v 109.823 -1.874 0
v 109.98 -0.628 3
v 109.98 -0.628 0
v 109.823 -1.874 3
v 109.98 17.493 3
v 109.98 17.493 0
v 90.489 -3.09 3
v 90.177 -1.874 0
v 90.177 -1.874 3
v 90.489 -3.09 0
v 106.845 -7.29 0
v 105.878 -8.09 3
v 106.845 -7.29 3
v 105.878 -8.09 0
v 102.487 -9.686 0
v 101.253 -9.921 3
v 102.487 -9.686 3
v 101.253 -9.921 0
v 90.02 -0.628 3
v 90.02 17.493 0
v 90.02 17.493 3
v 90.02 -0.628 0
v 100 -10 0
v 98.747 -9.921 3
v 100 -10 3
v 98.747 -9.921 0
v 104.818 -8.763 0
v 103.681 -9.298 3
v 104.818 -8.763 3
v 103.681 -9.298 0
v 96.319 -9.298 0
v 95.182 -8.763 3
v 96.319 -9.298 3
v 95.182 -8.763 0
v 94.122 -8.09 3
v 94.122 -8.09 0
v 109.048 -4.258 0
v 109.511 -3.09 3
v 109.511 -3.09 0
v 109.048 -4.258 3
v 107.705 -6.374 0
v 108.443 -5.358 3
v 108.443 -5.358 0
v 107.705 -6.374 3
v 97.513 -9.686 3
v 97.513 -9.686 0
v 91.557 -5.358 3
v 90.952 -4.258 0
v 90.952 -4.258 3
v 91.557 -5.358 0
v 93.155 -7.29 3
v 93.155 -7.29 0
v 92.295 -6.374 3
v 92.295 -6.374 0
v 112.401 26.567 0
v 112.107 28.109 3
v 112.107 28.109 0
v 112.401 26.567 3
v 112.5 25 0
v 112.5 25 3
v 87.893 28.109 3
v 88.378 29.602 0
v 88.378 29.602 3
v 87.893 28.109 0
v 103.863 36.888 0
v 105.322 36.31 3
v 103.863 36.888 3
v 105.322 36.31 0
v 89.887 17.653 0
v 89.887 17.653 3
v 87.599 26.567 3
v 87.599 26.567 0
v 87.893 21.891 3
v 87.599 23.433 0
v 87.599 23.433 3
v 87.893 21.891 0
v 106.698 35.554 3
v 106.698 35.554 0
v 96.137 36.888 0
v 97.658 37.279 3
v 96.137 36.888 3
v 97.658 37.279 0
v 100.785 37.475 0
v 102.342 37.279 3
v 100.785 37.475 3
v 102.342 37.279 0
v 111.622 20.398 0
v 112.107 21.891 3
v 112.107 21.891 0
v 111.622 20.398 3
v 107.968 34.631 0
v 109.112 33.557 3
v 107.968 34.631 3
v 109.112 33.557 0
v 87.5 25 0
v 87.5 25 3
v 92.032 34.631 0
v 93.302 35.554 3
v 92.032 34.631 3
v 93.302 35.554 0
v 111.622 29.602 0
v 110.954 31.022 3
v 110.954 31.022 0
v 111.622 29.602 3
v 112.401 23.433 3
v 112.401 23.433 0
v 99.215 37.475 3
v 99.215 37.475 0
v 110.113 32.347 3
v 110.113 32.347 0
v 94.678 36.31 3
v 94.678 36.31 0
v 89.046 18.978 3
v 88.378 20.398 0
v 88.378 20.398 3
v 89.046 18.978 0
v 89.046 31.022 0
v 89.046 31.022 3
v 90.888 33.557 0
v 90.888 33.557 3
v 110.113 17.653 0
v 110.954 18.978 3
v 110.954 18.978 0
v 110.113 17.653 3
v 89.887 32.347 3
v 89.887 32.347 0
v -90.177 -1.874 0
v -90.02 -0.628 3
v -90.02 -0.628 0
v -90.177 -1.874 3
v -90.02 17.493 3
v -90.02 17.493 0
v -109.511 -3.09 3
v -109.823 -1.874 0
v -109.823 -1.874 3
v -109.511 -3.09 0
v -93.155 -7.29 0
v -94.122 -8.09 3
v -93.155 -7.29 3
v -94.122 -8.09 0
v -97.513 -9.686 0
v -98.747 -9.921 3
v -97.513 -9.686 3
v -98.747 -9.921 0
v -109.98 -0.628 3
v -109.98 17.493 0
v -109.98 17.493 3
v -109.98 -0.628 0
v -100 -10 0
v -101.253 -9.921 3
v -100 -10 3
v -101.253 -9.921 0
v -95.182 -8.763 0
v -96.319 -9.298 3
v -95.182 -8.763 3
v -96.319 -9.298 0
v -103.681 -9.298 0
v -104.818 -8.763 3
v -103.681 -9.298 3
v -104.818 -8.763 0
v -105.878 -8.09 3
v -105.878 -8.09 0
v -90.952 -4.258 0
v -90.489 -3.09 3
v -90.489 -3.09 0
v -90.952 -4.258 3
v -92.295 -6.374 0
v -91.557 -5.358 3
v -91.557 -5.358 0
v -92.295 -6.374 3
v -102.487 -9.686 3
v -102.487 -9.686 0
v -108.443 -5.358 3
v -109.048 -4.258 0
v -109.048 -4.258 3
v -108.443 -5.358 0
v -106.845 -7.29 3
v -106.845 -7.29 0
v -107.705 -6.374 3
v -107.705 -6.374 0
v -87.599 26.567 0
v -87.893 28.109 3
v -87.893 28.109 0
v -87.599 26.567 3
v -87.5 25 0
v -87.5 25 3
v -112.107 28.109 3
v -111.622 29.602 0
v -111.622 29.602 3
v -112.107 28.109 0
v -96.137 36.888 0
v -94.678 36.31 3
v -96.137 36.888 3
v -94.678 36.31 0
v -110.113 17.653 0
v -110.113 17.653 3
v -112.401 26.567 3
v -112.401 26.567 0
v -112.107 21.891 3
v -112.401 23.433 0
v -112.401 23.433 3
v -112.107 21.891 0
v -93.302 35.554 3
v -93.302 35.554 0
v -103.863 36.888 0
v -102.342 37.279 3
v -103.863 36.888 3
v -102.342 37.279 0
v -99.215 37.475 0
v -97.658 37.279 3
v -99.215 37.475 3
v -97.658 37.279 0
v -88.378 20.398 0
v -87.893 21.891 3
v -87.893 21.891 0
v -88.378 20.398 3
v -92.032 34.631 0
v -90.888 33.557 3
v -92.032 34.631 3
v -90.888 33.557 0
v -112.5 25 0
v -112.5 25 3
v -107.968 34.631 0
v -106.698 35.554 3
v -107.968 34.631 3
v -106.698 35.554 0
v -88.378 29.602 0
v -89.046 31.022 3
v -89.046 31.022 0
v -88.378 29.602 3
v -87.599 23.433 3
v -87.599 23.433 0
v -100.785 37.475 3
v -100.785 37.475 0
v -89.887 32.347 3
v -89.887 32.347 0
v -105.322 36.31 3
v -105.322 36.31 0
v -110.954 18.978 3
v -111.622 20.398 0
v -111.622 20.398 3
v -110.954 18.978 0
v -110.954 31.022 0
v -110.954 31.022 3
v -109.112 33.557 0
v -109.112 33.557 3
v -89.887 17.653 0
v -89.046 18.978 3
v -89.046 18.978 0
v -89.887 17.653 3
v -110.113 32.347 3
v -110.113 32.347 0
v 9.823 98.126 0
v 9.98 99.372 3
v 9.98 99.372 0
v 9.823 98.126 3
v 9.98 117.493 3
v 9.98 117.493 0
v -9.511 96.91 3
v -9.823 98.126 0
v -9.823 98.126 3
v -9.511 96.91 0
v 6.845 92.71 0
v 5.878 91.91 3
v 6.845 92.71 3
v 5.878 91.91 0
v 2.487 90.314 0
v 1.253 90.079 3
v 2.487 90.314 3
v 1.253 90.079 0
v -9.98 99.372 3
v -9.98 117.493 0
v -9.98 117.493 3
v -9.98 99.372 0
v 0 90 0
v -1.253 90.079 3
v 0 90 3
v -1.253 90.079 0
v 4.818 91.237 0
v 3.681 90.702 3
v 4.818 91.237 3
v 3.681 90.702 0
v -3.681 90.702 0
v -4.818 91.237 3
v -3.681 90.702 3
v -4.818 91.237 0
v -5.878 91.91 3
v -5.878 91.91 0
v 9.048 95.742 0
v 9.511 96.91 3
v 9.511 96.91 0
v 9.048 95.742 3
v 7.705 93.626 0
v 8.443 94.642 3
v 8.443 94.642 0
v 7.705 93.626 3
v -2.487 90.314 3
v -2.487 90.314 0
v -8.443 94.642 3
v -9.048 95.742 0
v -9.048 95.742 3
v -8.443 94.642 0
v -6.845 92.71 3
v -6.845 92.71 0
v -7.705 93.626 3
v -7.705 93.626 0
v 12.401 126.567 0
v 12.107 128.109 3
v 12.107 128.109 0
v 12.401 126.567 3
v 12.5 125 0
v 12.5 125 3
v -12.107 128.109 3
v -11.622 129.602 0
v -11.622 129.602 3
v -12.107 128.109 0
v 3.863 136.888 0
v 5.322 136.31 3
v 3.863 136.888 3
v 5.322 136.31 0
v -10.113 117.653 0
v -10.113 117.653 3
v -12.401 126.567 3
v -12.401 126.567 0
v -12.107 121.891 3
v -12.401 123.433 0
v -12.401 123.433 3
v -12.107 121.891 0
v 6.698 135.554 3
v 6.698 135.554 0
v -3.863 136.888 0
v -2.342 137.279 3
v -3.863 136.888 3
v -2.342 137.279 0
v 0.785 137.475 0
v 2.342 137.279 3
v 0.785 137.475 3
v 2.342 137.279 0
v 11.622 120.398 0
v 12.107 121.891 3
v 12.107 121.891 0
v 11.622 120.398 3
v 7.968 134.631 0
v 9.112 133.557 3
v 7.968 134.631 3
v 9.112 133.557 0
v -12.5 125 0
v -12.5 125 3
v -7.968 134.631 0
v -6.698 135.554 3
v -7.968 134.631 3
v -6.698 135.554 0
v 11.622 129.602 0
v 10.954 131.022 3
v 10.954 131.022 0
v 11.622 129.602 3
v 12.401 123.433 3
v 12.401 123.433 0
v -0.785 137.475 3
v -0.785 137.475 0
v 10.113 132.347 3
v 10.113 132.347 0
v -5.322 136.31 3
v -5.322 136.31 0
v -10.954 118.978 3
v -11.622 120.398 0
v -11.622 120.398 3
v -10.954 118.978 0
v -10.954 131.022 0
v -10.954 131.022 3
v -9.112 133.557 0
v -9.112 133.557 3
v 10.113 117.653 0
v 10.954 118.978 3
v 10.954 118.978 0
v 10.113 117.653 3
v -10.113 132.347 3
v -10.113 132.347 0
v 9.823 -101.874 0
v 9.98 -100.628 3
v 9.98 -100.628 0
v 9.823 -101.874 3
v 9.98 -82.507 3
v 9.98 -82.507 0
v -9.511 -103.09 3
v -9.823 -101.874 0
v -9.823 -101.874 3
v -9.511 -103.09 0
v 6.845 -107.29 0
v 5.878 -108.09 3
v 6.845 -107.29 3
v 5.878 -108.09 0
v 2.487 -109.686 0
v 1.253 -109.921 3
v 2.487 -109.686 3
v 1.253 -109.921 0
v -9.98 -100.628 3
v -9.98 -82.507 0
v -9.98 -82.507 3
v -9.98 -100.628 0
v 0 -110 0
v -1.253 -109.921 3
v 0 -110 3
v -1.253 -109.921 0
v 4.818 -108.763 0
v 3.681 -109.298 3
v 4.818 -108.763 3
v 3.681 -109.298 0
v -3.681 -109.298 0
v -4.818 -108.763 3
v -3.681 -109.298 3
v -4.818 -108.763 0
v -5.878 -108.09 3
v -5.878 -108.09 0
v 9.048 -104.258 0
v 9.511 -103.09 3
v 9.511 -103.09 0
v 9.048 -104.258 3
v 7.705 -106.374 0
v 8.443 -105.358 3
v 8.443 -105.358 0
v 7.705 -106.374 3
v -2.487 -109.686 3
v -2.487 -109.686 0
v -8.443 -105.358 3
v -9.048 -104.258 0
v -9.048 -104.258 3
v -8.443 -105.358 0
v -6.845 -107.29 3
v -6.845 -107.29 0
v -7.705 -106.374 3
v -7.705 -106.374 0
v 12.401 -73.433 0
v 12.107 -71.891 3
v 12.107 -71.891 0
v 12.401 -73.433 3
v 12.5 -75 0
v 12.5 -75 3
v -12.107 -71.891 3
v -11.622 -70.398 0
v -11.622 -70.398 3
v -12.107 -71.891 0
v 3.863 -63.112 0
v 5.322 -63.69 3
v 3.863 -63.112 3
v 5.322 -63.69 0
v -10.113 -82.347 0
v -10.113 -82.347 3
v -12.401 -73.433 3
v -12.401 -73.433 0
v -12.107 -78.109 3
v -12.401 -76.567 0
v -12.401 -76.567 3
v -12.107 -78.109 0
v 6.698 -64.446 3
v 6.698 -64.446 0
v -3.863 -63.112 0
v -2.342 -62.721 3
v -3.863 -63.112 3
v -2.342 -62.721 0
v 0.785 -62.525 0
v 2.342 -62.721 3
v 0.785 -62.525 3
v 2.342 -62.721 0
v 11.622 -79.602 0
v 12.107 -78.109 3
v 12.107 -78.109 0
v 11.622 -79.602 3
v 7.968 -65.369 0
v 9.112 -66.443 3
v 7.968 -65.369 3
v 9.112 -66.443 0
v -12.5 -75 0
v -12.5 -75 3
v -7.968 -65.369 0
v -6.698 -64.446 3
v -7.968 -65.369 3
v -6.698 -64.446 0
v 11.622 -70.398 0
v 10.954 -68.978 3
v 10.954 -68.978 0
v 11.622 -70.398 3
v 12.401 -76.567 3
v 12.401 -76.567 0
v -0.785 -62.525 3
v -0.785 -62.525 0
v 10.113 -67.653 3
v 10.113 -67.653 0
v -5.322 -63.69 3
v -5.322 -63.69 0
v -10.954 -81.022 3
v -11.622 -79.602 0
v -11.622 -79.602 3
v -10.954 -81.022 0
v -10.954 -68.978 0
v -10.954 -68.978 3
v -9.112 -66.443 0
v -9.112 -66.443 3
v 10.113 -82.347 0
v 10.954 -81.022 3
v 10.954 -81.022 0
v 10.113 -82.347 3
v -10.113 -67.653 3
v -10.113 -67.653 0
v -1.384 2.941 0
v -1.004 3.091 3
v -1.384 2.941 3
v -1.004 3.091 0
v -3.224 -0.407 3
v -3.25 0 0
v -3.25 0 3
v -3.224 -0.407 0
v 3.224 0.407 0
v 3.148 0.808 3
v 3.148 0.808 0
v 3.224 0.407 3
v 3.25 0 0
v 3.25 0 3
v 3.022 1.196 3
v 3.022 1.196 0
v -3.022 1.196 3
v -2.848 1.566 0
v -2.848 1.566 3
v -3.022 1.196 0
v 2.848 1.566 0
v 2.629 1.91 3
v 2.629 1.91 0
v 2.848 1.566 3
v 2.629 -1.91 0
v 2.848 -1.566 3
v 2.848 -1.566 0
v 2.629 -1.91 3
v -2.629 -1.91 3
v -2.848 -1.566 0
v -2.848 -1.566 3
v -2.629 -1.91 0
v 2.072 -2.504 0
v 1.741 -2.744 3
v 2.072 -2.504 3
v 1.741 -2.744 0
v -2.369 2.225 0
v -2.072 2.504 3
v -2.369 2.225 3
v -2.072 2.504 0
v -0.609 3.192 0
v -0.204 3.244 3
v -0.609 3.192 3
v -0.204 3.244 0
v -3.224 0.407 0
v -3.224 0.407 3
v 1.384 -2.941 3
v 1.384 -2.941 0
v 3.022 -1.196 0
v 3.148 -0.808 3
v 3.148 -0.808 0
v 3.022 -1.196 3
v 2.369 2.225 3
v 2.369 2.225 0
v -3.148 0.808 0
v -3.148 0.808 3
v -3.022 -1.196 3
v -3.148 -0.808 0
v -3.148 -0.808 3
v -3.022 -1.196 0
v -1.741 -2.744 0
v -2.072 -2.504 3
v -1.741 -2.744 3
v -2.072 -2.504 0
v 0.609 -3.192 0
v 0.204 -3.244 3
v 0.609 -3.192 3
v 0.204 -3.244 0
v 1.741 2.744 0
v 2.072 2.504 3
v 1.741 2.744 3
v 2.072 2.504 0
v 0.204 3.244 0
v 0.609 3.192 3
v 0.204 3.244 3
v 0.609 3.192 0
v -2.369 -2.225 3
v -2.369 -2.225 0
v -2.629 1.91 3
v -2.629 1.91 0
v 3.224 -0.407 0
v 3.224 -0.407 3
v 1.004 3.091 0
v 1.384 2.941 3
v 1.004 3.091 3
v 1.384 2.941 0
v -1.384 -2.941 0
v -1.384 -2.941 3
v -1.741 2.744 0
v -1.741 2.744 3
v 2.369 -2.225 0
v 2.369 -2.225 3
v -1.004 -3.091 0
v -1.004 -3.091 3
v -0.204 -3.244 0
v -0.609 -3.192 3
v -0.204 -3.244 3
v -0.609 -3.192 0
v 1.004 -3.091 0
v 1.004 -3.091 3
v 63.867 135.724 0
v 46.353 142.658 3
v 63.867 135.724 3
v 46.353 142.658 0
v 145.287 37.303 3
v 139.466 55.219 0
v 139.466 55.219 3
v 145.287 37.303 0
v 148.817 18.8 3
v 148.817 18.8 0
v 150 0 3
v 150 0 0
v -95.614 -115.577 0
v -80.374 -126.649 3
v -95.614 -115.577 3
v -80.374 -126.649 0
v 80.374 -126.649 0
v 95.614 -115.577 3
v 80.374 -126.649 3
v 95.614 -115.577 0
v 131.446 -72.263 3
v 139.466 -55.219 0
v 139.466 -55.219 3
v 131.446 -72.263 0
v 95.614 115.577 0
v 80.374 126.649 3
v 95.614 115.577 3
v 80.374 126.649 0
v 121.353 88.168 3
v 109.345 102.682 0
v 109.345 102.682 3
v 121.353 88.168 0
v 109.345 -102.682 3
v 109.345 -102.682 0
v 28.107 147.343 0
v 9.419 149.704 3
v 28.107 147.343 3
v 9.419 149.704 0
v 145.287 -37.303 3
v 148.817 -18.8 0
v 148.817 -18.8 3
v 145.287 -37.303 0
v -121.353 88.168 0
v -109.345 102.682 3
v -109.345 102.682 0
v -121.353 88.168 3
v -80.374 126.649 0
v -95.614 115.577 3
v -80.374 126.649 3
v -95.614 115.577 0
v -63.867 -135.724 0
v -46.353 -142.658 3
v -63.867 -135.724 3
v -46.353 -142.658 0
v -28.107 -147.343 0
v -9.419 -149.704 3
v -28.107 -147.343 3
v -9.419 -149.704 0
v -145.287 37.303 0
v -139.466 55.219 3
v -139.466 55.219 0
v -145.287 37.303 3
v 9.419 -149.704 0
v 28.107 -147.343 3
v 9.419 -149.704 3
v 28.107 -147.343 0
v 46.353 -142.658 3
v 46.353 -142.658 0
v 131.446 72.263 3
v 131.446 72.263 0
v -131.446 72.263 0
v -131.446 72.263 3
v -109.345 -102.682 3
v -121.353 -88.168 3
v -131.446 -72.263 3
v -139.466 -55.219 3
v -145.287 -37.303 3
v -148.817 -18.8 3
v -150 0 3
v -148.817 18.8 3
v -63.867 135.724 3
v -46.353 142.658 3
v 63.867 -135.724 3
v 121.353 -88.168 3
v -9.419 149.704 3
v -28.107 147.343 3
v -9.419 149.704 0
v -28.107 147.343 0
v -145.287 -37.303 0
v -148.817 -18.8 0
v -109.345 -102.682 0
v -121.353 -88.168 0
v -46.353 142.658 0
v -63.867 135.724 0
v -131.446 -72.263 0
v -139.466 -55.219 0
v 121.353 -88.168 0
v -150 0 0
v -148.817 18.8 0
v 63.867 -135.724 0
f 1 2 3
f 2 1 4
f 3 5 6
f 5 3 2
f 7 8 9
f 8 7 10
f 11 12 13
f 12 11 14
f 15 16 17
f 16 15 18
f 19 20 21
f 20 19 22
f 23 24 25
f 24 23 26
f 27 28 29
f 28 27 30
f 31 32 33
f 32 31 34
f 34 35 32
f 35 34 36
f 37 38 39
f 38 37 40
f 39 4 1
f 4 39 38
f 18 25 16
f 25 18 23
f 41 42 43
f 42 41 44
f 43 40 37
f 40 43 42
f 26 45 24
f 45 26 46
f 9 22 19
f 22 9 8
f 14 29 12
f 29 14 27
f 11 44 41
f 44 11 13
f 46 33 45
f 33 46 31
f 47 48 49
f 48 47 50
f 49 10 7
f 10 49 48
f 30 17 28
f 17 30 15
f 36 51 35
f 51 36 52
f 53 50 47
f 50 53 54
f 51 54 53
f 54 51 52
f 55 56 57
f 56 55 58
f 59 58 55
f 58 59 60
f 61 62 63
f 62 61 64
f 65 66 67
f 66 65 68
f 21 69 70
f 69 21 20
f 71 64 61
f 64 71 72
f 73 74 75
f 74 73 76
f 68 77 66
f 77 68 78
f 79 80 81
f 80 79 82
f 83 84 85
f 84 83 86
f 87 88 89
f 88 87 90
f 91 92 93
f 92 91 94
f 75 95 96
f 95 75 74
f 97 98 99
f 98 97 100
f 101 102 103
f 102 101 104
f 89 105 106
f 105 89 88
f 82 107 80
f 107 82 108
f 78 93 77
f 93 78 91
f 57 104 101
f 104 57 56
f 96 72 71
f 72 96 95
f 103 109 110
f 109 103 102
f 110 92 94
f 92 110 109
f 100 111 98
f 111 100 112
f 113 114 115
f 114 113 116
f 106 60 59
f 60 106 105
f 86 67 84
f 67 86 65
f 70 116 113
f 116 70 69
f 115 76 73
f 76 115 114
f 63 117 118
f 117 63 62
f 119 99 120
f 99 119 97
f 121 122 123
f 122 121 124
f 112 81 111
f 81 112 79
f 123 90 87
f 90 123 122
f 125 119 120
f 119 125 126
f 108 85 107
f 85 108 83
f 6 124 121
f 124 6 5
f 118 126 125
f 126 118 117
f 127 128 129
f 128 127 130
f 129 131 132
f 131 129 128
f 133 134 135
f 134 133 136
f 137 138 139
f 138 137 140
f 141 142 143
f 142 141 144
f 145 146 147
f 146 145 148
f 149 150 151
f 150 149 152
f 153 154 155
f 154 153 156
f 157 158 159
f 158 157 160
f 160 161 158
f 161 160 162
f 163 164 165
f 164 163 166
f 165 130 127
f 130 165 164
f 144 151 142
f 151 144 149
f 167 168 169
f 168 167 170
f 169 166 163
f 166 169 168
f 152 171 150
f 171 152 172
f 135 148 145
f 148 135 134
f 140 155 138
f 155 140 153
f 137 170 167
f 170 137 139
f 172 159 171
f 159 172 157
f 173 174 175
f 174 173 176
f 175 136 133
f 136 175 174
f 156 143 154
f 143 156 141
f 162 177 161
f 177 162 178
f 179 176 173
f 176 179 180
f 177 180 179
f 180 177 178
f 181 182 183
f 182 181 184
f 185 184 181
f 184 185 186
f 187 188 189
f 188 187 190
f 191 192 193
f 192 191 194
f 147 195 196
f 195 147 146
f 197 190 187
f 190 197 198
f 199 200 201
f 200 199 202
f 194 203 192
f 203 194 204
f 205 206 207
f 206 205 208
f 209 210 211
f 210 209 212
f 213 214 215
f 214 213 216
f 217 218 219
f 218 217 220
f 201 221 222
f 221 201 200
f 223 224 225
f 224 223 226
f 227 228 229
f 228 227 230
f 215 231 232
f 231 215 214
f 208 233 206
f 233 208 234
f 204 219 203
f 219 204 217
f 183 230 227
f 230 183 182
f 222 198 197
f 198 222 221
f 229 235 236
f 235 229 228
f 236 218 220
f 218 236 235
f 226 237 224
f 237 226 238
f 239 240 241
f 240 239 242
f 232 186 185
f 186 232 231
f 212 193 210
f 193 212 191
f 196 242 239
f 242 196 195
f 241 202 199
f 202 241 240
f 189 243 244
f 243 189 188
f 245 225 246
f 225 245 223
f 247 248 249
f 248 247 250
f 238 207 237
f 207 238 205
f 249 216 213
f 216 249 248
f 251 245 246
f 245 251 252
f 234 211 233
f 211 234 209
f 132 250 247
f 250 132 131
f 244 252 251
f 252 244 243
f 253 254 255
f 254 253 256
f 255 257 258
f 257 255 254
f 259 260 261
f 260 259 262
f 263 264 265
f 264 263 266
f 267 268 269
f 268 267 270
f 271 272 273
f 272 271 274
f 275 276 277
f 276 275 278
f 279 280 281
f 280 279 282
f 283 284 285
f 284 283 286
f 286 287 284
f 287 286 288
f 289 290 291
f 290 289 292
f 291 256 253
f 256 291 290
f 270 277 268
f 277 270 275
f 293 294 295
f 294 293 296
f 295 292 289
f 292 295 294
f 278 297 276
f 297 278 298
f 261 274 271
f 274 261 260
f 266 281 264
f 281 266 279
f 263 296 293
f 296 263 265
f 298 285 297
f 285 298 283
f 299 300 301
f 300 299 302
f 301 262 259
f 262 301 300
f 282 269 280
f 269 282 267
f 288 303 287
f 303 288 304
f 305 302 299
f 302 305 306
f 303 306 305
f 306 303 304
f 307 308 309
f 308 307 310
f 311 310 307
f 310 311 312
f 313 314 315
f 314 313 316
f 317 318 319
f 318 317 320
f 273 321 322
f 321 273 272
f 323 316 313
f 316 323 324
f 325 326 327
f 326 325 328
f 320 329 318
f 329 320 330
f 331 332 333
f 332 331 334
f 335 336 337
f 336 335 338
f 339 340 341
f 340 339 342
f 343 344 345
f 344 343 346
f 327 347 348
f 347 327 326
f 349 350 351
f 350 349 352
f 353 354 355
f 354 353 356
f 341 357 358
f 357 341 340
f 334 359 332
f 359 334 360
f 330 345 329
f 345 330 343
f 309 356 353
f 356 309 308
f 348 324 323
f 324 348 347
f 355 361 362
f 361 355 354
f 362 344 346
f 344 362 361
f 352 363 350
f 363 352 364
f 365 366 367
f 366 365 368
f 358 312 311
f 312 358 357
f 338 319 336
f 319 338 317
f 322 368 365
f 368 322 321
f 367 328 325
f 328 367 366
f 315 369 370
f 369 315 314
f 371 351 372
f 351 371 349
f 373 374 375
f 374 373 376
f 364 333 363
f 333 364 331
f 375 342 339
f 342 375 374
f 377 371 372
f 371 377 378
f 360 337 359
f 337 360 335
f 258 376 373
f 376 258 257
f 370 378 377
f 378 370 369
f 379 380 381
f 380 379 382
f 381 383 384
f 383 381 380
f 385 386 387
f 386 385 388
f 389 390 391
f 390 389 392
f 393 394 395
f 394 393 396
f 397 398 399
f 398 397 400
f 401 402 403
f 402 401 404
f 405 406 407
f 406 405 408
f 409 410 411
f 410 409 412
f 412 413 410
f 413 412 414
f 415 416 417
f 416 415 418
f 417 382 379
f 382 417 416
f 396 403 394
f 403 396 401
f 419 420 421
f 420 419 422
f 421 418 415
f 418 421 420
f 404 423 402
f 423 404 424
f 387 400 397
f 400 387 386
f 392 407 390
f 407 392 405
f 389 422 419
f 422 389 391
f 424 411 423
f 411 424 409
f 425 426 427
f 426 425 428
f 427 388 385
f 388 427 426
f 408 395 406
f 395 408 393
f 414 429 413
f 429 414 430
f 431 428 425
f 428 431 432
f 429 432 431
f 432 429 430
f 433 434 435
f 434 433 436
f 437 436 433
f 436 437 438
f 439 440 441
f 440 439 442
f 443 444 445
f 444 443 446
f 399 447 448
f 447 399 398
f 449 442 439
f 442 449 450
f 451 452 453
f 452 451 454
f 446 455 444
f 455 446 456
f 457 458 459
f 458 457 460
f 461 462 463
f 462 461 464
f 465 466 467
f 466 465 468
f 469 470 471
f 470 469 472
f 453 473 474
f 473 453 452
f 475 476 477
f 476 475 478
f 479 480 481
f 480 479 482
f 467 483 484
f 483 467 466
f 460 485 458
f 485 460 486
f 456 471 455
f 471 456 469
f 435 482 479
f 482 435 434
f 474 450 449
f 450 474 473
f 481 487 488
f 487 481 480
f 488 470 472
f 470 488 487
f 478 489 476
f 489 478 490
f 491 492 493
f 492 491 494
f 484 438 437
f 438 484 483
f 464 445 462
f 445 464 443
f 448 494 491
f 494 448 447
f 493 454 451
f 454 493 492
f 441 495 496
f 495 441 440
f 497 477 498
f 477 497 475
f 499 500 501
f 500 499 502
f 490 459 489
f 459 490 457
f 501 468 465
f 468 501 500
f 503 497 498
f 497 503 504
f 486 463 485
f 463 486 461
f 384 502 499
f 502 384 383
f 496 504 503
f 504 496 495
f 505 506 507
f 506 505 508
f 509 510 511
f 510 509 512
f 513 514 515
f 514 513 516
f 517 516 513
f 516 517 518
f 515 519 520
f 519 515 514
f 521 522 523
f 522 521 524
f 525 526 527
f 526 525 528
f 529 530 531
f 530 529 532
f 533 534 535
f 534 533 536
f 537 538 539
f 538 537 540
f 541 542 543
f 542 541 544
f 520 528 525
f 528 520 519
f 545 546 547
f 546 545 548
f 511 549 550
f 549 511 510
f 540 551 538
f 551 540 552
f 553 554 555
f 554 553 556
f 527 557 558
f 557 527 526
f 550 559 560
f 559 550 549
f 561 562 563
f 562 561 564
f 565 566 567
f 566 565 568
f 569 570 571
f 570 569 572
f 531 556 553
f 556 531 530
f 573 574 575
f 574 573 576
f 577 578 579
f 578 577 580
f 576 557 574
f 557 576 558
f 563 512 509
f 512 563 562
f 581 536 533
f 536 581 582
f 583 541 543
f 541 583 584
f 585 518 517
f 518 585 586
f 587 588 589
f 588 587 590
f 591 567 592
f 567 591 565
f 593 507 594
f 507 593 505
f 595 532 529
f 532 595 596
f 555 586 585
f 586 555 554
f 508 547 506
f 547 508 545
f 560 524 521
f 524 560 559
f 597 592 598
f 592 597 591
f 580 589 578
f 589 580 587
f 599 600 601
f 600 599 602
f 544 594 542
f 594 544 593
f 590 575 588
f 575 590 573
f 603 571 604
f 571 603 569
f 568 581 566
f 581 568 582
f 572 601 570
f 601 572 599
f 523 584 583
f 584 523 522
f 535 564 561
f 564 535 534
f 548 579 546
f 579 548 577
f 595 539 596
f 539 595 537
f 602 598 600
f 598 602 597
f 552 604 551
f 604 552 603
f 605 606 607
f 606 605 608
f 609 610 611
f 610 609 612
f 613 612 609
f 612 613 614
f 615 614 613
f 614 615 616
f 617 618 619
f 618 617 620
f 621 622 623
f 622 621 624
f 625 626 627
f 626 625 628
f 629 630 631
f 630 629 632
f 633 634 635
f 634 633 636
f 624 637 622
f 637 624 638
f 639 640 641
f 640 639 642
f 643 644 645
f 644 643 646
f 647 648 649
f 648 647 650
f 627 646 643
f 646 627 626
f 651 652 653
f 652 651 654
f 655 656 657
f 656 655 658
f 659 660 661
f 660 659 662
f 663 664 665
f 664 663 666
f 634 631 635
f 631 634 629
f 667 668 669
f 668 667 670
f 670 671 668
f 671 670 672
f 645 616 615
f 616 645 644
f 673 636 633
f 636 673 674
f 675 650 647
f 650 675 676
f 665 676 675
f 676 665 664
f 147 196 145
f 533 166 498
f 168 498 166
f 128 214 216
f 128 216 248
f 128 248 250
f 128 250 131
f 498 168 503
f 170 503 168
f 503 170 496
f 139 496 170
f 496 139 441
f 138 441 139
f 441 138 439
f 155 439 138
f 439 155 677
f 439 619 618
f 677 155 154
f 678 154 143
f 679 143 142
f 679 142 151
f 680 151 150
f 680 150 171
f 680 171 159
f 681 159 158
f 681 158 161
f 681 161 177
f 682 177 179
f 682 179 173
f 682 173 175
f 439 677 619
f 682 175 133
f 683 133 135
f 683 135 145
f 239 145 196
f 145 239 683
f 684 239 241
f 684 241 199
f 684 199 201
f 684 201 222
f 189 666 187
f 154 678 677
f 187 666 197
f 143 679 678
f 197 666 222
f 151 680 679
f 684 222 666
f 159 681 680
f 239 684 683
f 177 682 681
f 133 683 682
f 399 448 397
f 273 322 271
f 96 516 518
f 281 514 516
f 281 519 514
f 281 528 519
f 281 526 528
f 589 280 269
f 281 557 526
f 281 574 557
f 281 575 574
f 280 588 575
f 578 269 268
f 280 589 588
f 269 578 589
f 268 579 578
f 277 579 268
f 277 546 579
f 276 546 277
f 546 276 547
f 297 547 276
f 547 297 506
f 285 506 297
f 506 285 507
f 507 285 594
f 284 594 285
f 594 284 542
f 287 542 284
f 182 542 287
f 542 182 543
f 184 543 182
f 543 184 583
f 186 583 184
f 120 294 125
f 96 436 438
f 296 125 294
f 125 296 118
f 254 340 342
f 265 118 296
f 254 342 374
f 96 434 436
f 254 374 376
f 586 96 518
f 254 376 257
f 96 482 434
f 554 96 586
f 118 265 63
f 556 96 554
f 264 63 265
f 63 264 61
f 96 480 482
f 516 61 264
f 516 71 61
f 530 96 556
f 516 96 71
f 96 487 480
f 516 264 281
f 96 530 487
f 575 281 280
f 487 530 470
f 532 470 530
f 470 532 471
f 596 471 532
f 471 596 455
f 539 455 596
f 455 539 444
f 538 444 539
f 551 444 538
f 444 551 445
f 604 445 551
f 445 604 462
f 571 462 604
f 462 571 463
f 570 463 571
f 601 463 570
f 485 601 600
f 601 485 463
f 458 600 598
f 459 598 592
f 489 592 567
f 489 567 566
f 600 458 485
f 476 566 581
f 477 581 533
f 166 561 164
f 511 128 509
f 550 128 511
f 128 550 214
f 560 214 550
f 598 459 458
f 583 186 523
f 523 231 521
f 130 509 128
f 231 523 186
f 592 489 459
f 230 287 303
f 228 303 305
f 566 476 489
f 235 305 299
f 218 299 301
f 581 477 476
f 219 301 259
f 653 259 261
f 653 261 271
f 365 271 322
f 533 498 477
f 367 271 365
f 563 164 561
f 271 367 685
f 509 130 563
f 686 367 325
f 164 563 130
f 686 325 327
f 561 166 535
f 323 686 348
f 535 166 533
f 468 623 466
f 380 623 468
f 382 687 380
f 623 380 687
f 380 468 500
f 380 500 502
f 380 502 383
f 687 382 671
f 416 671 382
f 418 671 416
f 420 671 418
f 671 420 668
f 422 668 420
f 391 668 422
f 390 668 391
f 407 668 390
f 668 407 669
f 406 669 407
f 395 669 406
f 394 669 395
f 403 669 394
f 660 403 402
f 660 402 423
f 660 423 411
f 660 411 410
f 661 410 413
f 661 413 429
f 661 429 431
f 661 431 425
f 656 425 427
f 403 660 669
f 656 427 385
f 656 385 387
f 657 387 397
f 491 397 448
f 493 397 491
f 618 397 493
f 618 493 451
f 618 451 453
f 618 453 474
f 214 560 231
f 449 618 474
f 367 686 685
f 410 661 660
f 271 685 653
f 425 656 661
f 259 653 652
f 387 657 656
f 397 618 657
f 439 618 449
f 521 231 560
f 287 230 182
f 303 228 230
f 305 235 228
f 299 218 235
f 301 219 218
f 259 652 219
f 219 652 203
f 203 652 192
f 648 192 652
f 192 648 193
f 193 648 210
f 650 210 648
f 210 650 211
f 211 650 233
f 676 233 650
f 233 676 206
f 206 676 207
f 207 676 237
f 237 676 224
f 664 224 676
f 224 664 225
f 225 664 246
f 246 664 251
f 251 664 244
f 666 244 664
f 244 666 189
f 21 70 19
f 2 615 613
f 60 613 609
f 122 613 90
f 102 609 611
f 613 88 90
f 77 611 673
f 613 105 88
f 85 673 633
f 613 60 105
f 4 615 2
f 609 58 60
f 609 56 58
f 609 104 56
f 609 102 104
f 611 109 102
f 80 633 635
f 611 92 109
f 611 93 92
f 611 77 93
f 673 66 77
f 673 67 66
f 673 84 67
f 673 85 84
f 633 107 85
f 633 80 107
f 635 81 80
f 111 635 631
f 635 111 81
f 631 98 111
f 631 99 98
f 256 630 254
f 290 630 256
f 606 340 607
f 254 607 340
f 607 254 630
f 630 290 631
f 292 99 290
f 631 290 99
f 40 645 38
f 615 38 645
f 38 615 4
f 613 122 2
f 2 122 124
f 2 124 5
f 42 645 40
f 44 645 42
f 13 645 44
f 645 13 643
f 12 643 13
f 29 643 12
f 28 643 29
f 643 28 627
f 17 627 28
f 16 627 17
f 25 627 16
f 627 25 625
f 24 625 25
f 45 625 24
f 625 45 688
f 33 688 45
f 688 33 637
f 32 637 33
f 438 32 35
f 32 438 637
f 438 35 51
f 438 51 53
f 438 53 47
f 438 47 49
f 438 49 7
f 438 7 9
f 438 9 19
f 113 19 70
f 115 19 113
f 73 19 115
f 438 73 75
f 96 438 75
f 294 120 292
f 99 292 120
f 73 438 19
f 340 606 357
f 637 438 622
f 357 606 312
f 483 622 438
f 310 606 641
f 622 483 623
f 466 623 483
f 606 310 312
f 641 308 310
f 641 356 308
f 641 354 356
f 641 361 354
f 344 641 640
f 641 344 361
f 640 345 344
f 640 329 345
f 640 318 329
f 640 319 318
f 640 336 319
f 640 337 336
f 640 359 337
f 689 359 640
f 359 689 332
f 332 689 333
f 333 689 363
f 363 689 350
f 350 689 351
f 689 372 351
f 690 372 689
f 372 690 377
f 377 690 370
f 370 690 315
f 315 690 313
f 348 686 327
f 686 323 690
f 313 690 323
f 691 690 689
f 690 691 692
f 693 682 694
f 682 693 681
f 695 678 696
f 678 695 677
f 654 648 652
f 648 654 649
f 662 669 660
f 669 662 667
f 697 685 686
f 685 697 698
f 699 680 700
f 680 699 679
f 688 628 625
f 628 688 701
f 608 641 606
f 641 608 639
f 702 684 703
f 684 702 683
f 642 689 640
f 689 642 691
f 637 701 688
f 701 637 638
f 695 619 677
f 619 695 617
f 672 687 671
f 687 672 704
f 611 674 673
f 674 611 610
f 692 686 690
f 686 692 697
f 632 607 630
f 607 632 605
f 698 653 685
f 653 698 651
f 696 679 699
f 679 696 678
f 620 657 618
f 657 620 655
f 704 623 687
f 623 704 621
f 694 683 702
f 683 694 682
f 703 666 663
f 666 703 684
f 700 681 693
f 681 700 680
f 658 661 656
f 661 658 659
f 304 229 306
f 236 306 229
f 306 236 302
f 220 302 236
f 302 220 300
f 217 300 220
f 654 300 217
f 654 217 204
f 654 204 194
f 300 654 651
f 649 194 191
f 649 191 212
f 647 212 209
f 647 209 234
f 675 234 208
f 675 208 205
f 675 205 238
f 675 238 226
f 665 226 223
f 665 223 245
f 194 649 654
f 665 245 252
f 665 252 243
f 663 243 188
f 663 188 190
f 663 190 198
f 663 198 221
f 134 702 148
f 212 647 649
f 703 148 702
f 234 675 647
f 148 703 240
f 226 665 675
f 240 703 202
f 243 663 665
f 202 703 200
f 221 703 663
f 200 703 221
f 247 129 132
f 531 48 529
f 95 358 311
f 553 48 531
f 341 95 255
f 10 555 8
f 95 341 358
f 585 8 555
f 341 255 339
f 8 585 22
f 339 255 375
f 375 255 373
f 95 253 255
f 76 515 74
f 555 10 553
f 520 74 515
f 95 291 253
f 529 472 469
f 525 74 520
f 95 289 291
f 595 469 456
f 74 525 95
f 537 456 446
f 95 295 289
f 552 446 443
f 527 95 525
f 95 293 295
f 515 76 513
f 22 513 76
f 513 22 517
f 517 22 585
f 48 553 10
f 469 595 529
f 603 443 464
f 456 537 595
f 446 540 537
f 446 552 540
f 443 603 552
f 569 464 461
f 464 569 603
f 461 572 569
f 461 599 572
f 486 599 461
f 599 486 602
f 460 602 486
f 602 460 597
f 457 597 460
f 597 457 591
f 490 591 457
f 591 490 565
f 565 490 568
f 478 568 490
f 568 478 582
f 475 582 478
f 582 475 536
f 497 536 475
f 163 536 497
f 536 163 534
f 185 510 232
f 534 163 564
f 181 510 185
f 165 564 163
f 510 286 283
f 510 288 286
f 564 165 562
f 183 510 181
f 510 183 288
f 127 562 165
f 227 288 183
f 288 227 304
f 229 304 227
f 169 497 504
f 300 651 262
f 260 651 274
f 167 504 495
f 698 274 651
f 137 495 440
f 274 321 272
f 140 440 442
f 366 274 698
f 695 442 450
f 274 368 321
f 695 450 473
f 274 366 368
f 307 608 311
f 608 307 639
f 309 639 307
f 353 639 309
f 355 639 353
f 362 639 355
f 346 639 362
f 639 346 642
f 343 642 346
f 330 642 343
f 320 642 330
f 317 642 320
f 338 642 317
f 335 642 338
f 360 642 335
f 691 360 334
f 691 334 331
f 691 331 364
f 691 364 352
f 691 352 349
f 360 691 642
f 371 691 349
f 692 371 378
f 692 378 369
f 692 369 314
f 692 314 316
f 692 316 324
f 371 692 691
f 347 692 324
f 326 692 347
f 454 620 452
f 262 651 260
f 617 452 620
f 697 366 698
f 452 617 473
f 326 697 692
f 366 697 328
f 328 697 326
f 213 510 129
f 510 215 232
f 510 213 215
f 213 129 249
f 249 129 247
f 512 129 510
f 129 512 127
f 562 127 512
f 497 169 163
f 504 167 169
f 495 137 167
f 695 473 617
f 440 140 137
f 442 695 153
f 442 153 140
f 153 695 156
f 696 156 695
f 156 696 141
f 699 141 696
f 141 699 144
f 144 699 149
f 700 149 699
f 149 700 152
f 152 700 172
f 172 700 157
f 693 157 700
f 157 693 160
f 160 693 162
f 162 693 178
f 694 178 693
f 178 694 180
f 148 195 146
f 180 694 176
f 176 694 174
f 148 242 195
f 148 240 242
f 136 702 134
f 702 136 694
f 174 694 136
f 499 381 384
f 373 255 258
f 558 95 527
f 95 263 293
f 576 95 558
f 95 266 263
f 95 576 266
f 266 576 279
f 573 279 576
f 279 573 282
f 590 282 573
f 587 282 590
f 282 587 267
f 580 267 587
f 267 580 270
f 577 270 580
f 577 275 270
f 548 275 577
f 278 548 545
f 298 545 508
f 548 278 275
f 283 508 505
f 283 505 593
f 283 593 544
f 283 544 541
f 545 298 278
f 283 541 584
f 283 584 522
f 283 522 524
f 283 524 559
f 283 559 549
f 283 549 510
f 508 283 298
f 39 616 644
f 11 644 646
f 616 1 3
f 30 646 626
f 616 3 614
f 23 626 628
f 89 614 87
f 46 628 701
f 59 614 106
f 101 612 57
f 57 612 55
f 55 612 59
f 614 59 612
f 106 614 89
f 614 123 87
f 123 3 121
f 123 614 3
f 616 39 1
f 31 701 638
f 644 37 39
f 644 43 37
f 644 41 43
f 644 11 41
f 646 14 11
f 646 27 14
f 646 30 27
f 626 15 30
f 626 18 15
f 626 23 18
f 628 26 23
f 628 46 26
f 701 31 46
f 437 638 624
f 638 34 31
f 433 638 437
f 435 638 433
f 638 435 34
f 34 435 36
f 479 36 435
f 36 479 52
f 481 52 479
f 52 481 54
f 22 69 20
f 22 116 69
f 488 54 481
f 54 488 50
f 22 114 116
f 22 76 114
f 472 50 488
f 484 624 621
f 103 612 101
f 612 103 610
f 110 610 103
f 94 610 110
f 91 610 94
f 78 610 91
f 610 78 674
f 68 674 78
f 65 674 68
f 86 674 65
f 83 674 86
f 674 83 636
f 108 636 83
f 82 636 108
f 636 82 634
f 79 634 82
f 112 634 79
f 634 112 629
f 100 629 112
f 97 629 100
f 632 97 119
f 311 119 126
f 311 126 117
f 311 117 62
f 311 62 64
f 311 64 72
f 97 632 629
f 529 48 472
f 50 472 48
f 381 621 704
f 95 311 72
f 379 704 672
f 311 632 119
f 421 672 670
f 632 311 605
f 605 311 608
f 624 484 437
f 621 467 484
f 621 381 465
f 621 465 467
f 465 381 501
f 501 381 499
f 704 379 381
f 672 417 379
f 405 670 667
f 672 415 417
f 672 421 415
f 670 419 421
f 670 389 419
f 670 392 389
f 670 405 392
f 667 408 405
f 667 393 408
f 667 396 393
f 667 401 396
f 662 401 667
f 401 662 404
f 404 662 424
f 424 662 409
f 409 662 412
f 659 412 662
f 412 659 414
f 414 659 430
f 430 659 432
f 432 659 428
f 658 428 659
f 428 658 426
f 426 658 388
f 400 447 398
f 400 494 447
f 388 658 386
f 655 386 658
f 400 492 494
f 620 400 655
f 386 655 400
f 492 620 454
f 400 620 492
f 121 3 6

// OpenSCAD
// Generated by SolidPython 1.1.3 on 2022-12-28 18:05:40
$fn = 50;


difference() {
	union() {
		translate(v = [0, 0, 0]) {
			rotate(a = [0, 0, 0]) {
				cylinder(h = 3, r = 150);
			}
		}
	}
	union() {
		translate(v = [0, 0, 0]) {
			rotate(a = [0, 0, 0]) {
				translate(v = [0, 0, -50]) {
					rotate(a = [0, 0, 0]) {
						cylinder(h = 100, r = 3.2500000000);
					}
				}
			}
		}
		translate(v = [100, 0, 0]) {
			rotate(a = [0, 0, 0]) {
				difference() {
					union() {
						translate(v = [0, 12.5000000000, 0]) {
							rotate(a = [0, 0, 90]) {
								hull() {
									translate(v = [12.5000000000, 0, 0]) {
										rotate(a = [0, 0, 0]) {
											translate(v = [0, 0, -50]) {
												rotate(a = [0, 0, 0]) {
													cylinder(h = 100, r = 10.0000000000);
												}
											}
										}
									}
									translate(v = [-12.5000000000, 0, 0]) {
										rotate(a = [0, 0, 0]) {
											translate(v = [0, 0, -50]) {
												rotate(a = [0, 0, 0]) {
													cylinder(h = 100, r = 10.0000000000);
												}
											}
										}
									}
								}
							}
						}
						translate(v = [0, 25.0000000000, 0]) {
							rotate(a = [0, 0, 0]) {
								translate(v = [0, 0, -50]) {
									rotate(a = [0, 0, 0]) {
										cylinder(h = 100, r = 12.5000000000);
									}
								}
							}
						}
					}
					union();
				}
			}
		}
		translate(v = [-100, 0, 0]) {
			rotate(a = [0, 0, 0]) {
				difference() {
					union() {
						translate(v = [0, 12.5000000000, 0]) {
							rotate(a = [0, 0, 90]) {
								hull() {
									translate(v = [12.5000000000, 0, 0]) {
										rotate(a = [0, 0, 0]) {
											translate(v = [0, 0, -50]) {
												rotate(a = [0, 0, 0]) {
													cylinder(h = 100, r = 10.0000000000);
												}
											}
										}
									}
									translate(v = [-12.5000000000, 0, 0]) {
										rotate(a = [0, 0, 0]) {
											translate(v = [0, 0, -50]) {
												rotate(a = [0, 0, 0]) {
													cylinder(h = 100, r = 10.0000000000);
												}
											}
										}
									}
								}
							}
						}
						translate(v = [0, 25.0000000000, 0]) {
							rotate(a = [0, 0, 0]) {
								translate(v = [0, 0, -50]) {
									rotate(a = [0, 0, 0]) {
										cylinder(h = 100, r = 12.5000000000);
									}
								}
							}
						}
					}
					union();
				}
			}
		}
		translate(v = [0, 100, 0]) {
			rotate(a = [0, 0, 0]) {
				difference() {
					union() {
						translate(v = [0, 12.5000000000, 0]) {
							rotate(a = [0, 0, 90]) {
								hull() {
									translate(v = [12.5000000000, 0, 0]) {
										rotate(a = [0, 0, 0]) {
											translate(v = [0, 0, -50]) {
												rotate(a = [0, 0, 0]) {
													cylinder(h = 100, r = 10.0000000000);
												}
											}
										}
									}
									translate(v = [-12.5000000000, 0, 0]) {
										rotate(a = [0, 0, 0]) {
											translate(v = [0, 0, -50]) {
												rotate(a = [0, 0, 0]) {
													cylinder(h = 100, r = 10.0000000000);
												}
											}
										}
									}
								}
							}
						}
						translate(v = [0, 25.0000000000, 0]) {
							rotate(a = [0, 0, 0]) {
								translate(v = [0, 0, -50]) {
									rotate(a = [0, 0, 0]) {
										cylinder(h = 100, r = 12.5000000000);
									}
								}
							}
						}
					}
					union();
				}
			}
		}
		translate(v = [0, -100, 0]) {
			rotate(a = [0, 0, 0]) {
				difference() {
					union() {
						translate(v = [0, 12.5000000000, 0]) {
							rotate(a = [0, 0, 90]) {
								hull() {
									translate(v = [12.5000000000, 0, 0]) {
										rotate(a = [0, 0, 0]) {
											translate(v = [0, 0, -50]) {
												rotate(a = [0, 0, 0]) {
													cylinder(h = 100, r = 10.0000000000);
												}
											}
										}
									}
									translate(v = [-12.5000000000, 0, 0]) {
										rotate(a = [0, 0, 0]) {
											translate(v = [0, 0, -50]) {
												rotate(a = [0, 0, 0]) {
													cylinder(h = 100, r = 10.0000000000);
												}
											}
										}
									}
								}
							}
						}
						translate(v = [0, 25.0000000000, 0]) {
							rotate(a = [0, 0, 0]) {
								translate(v = [0, 0, -50]) {
									rotate(a = [0, 0, 0]) {
										cylinder(h = 100, r = 12.5000000000);
									}
								}
							}
						}
					}
					union();
				}
			}
		}
	}
}
/***********************************************
*********      SolidPython code:      **********
************************************************
 
from solid import *
import os

import OPSC_library_gen

defined_objects = {}

radius_dict = {}
radius_dict['M6'] = 6.5/2

def opsc_make_object(filename, objects, resolution=50):
    final_object = opsc_get_object(objects)
    # Save the final object to the specified filename
    
    scad_render_to_file(final_object, filename, file_header='$fn = %s;' % resolution, include_orig_code=True)

def opsc_get_object(objects):
    # Create the solidpython objects
    positive_objects = [get_opsc_item(obj) for obj in objects if obj['type'] == 'positive']
    negative_objects = [get_opsc_item(obj) for obj in objects if obj['type'] == 'negative']
    # Union the positive objects
    positive_object = union()(*positive_objects)
    # Union the negative objects
    negative_object = union()(*negative_objects)
    # Create the final object by subtracting the negative objects from the positive objects
    return difference()(positive_object, negative_object)

def get_opsc_item(params):
    # A dictionary to map radius string values to numerical values
    #radius_dict = {'small': 5, 'medium': 10, 'large': 15}
    # An array of function names for basic shapes
    basic_shapes = ['cube', 'sphere', 'cylinder']
    
    # An array of function names for other shapes
    other_shapes = ['hole', 'slot', 'rounded_rectangle']
    


    # Convert radius to r if present, and remove radius from the params dictionary
    if 'radius' in params:
        if isinstance(params['radius'], str):
            # Use the radius_dict to map the radius string value to a numerical value
            params['r'] = radius_dict[params['radius']]
        else:
            params['r'] = params['radius']
        del params['radius']
    

    # Check if the object type is a basic shape
    if params['shape'] in basic_shapes:
        # Remove shape and unexpected dictionary values
        allowed_keys = {'size', 'r', 'd', 'h', 'rw', 'rh', 'dw', 'dh'}
        shape_params = {k: v for k, v in params.items() if k in allowed_keys}

        # Call the corresponding function for the shape parameter, using ** notation to pass the shape_params dictionary as keyword arguments
        return get_opsc_transform(params,globals()[params['shape']](**shape_params))
    
    # If the object type is not a basic shape, check if it's a defined object or one of the other shapes
    elif params['shape'] in other_shapes:
        # Call the corresponding function for the shape parameter, passing the params dictionary as an argument
        return get_opsc_transform(params,globals()[params['shape']](params))
    
    # If the object is not a basic shape or a defined object, try to import it from a .scad file
    else:
        obj = defined_objects[params['shape']]
        return get_opsc_transform(params,obj)

def get_opsc_transform(params, solid_obj):
    # Rotate the object based on the 'rot' field in the params dictionary, or the 'rotX', 'rotY', and 'rotZ' fields if 'rot' is not present
    rot = params.get('rot', [])
    if rot:
        rotX, rotY, rotZ = rot
    else:
        rotX = params.get('rotX', 0)
        rotY = params.get('rotY', 0)
        rotZ = params.get('rotZ', 0)
    solid_obj = rotate([rotX, rotY, rotZ])(solid_obj)

    # Translate the object based on the 'pos' field in the params dictionary, or the 'x', 'y', and 'z' fields if 'pos' is not present
    pos = params.get('pos', [])
    if pos:
        x, y, z = pos
    else:
        x = params.get('x', 0)
        y = params.get('y', 0)
        z = params.get('z', 0)
    solid_obj = translate([x, y, z])(solid_obj)
    return solid_obj


import random

def opsc_easy(type, shape, **kwargs):
    obj = {
        'type': type,
        'shape': shape
    }
    for param in ['size', 'r', 'd', 'h', 'rw', 'rh', 'dw', 'dh', 'pos', 'x', 'y', 'z', 'rot', 'rotX', 'rotY', 'rotZ', "w"]:
        if param in kwargs:
            obj[param] = kwargs[param]
    return obj

def hole(params):
    p2 = copy.deepcopy(params)  
    # Check if the radius is a string and replace it with the corresponding value from the dictionary
    if isinstance(p2['r'], str):
        p2['r'] = radius_dict[p2['r']]
    
    # Set the height to 100 if not specified
    if 'h' not in p2:
        p2['h'] = 100
    p2["pos"] = [0,0,-50]
    p2["center"] = True
    # Create the cylinder object
    p2["shape"] = "cylinder"
    p2["type"] = "positive"

    return get_opsc_item(p2)

import copy

def slot(params):  
    p2 = copy.deepcopy(params) 
    if isinstance(p2['r'], str):
        p2['r'] = radius_dict[p2['r']]
    p2["type"] = "positive"
    p2["shape"] = "hole"
    del p2["rot"]
    p2["pos"] = [0,0,0]
    left = copy.deepcopy(p2)
    right = copy.deepcopy(p2)
    left["pos"][0] = p2["w"] / 2 - p2["r"] 
    
    right["pos"][0] = -p2["w"] / 2 + p2["r"] 
    pass
    leftObj = get_opsc_item(left)
    rightObj = get_opsc_item(right)
    return hull()(leftObj, rightObj)

def rounded_rectangle(params):   
    p2 = copy.deepcopy(params) 
    p2["pos"] = p2.get("pos", [0, 0, 0]) 
    p2["type"] = "positive"
    p2["shape"] = "hole"
    p2["pos"] = [0,0,0]
    p2["h"] = p2["size"][2]
    del p2["rot"]    
    tl = copy.deepcopy(p2)
    tr = copy.deepcopy(p2)
    bl = copy.deepcopy(p2)
    br = copy.deepcopy(p2)
    tl["pos"][0] = p2["size"][0] / 2 - p2["r"] / 2
    tl["pos"][1] = p2["size"][1] / 2 - p2["r"] / 2
    tr["pos"][0] = p2["size"][0] / 2 + p2["r"] / 2
    tr["pos"][1] = p2["size"][1] / 2 - p2["r"] / 2
    bl["pos"][0] = p2["size"][0] / 2 - p2["r"] / 2
    bl["pos"][1] = p2["size"][1] / 2 + p2["r"] / 2
    br["pos"][0] = p2["size"][0] / 2 + p2["r"] / 2
    br["pos"][1] = p2["size"][1] / 2 + p2["r"] / 2
    del tl["size"]
    del tr["size"]
    del bl["size"]
    del br["size"]
    tlo = get_opsc_item(tl)
    tro = get_opsc_item(tr)
    blo = get_opsc_item(bl)
    bro = get_opsc_item(br)    
    return hull()(tlo, tro, blo, bro)



def import_scad_object(filename):
    # Import the .scad file and convert it to a solidpython object
    #filename = "parts"
    obj = import_scad(filename)
    return obj.main()
    


import os
import solid as solidpython

# A dictionary to store the defined objects


def load_scad_objects():
    OPSC_library_gen.gen_library(defined_objects)

import random

def test(num_objects):
    objects = []
    for i in range(num_objects):
        # Choose a random shape
        #shape = random.choice(['cube', 'sphere', 'cylinder', 'hole', 'slot', "rounded_rectangle"])
        shape = random.choice(["rounded_rectangle"])

        # Choose a random type
        type = random.choice(['positive', 'negative'])
        
        # Create an empty object dictionary
        obj = {'shape': shape, 'type': type}
        
        # Set shape-specific parameters
        if obj['shape'] in ['cube']:
            obj['size'] =  [random.uniform(5, 15), random.uniform(5, 15), random.uniform(5, 15)]
        if obj['shape'] in ['rounded_rectangle']:
            obj['size'] =  [random.uniform(5, 15), random.uniform(5, 15), random.uniform(5, 15)]
            obj['r'] = random.uniform(0.5, 5)
        elif obj['shape'] == 'sphere':
            obj['r'] = random.uniform(5, 15)
        elif obj['shape'] in ['cylinder', 'hole']:
            obj['r'] = random.uniform(0.5, 5)
            obj['h'] = random.uniform(5, 15)
        elif obj['shape'] == 'slot':
            obj['r'] = random.uniform(0.5, 5)
            obj['h'] = random.uniform(5, 15)
            obj['w'] = random.uniform(5, 15)
        
        # Set a random position and rotation
        obj['pos'] = [random.uniform(-20, 20), random.uniform(-20, 20), random.uniform(-20, 20)]
        obj['rot'] = [random.uniform(-180, 180), random.uniform(-180, 180), random.uniform(-180, 180)]
        
        # Add the object to the list
        objects.append(obj)
    return objects


load_scad_objects() 
 
************************************************/
